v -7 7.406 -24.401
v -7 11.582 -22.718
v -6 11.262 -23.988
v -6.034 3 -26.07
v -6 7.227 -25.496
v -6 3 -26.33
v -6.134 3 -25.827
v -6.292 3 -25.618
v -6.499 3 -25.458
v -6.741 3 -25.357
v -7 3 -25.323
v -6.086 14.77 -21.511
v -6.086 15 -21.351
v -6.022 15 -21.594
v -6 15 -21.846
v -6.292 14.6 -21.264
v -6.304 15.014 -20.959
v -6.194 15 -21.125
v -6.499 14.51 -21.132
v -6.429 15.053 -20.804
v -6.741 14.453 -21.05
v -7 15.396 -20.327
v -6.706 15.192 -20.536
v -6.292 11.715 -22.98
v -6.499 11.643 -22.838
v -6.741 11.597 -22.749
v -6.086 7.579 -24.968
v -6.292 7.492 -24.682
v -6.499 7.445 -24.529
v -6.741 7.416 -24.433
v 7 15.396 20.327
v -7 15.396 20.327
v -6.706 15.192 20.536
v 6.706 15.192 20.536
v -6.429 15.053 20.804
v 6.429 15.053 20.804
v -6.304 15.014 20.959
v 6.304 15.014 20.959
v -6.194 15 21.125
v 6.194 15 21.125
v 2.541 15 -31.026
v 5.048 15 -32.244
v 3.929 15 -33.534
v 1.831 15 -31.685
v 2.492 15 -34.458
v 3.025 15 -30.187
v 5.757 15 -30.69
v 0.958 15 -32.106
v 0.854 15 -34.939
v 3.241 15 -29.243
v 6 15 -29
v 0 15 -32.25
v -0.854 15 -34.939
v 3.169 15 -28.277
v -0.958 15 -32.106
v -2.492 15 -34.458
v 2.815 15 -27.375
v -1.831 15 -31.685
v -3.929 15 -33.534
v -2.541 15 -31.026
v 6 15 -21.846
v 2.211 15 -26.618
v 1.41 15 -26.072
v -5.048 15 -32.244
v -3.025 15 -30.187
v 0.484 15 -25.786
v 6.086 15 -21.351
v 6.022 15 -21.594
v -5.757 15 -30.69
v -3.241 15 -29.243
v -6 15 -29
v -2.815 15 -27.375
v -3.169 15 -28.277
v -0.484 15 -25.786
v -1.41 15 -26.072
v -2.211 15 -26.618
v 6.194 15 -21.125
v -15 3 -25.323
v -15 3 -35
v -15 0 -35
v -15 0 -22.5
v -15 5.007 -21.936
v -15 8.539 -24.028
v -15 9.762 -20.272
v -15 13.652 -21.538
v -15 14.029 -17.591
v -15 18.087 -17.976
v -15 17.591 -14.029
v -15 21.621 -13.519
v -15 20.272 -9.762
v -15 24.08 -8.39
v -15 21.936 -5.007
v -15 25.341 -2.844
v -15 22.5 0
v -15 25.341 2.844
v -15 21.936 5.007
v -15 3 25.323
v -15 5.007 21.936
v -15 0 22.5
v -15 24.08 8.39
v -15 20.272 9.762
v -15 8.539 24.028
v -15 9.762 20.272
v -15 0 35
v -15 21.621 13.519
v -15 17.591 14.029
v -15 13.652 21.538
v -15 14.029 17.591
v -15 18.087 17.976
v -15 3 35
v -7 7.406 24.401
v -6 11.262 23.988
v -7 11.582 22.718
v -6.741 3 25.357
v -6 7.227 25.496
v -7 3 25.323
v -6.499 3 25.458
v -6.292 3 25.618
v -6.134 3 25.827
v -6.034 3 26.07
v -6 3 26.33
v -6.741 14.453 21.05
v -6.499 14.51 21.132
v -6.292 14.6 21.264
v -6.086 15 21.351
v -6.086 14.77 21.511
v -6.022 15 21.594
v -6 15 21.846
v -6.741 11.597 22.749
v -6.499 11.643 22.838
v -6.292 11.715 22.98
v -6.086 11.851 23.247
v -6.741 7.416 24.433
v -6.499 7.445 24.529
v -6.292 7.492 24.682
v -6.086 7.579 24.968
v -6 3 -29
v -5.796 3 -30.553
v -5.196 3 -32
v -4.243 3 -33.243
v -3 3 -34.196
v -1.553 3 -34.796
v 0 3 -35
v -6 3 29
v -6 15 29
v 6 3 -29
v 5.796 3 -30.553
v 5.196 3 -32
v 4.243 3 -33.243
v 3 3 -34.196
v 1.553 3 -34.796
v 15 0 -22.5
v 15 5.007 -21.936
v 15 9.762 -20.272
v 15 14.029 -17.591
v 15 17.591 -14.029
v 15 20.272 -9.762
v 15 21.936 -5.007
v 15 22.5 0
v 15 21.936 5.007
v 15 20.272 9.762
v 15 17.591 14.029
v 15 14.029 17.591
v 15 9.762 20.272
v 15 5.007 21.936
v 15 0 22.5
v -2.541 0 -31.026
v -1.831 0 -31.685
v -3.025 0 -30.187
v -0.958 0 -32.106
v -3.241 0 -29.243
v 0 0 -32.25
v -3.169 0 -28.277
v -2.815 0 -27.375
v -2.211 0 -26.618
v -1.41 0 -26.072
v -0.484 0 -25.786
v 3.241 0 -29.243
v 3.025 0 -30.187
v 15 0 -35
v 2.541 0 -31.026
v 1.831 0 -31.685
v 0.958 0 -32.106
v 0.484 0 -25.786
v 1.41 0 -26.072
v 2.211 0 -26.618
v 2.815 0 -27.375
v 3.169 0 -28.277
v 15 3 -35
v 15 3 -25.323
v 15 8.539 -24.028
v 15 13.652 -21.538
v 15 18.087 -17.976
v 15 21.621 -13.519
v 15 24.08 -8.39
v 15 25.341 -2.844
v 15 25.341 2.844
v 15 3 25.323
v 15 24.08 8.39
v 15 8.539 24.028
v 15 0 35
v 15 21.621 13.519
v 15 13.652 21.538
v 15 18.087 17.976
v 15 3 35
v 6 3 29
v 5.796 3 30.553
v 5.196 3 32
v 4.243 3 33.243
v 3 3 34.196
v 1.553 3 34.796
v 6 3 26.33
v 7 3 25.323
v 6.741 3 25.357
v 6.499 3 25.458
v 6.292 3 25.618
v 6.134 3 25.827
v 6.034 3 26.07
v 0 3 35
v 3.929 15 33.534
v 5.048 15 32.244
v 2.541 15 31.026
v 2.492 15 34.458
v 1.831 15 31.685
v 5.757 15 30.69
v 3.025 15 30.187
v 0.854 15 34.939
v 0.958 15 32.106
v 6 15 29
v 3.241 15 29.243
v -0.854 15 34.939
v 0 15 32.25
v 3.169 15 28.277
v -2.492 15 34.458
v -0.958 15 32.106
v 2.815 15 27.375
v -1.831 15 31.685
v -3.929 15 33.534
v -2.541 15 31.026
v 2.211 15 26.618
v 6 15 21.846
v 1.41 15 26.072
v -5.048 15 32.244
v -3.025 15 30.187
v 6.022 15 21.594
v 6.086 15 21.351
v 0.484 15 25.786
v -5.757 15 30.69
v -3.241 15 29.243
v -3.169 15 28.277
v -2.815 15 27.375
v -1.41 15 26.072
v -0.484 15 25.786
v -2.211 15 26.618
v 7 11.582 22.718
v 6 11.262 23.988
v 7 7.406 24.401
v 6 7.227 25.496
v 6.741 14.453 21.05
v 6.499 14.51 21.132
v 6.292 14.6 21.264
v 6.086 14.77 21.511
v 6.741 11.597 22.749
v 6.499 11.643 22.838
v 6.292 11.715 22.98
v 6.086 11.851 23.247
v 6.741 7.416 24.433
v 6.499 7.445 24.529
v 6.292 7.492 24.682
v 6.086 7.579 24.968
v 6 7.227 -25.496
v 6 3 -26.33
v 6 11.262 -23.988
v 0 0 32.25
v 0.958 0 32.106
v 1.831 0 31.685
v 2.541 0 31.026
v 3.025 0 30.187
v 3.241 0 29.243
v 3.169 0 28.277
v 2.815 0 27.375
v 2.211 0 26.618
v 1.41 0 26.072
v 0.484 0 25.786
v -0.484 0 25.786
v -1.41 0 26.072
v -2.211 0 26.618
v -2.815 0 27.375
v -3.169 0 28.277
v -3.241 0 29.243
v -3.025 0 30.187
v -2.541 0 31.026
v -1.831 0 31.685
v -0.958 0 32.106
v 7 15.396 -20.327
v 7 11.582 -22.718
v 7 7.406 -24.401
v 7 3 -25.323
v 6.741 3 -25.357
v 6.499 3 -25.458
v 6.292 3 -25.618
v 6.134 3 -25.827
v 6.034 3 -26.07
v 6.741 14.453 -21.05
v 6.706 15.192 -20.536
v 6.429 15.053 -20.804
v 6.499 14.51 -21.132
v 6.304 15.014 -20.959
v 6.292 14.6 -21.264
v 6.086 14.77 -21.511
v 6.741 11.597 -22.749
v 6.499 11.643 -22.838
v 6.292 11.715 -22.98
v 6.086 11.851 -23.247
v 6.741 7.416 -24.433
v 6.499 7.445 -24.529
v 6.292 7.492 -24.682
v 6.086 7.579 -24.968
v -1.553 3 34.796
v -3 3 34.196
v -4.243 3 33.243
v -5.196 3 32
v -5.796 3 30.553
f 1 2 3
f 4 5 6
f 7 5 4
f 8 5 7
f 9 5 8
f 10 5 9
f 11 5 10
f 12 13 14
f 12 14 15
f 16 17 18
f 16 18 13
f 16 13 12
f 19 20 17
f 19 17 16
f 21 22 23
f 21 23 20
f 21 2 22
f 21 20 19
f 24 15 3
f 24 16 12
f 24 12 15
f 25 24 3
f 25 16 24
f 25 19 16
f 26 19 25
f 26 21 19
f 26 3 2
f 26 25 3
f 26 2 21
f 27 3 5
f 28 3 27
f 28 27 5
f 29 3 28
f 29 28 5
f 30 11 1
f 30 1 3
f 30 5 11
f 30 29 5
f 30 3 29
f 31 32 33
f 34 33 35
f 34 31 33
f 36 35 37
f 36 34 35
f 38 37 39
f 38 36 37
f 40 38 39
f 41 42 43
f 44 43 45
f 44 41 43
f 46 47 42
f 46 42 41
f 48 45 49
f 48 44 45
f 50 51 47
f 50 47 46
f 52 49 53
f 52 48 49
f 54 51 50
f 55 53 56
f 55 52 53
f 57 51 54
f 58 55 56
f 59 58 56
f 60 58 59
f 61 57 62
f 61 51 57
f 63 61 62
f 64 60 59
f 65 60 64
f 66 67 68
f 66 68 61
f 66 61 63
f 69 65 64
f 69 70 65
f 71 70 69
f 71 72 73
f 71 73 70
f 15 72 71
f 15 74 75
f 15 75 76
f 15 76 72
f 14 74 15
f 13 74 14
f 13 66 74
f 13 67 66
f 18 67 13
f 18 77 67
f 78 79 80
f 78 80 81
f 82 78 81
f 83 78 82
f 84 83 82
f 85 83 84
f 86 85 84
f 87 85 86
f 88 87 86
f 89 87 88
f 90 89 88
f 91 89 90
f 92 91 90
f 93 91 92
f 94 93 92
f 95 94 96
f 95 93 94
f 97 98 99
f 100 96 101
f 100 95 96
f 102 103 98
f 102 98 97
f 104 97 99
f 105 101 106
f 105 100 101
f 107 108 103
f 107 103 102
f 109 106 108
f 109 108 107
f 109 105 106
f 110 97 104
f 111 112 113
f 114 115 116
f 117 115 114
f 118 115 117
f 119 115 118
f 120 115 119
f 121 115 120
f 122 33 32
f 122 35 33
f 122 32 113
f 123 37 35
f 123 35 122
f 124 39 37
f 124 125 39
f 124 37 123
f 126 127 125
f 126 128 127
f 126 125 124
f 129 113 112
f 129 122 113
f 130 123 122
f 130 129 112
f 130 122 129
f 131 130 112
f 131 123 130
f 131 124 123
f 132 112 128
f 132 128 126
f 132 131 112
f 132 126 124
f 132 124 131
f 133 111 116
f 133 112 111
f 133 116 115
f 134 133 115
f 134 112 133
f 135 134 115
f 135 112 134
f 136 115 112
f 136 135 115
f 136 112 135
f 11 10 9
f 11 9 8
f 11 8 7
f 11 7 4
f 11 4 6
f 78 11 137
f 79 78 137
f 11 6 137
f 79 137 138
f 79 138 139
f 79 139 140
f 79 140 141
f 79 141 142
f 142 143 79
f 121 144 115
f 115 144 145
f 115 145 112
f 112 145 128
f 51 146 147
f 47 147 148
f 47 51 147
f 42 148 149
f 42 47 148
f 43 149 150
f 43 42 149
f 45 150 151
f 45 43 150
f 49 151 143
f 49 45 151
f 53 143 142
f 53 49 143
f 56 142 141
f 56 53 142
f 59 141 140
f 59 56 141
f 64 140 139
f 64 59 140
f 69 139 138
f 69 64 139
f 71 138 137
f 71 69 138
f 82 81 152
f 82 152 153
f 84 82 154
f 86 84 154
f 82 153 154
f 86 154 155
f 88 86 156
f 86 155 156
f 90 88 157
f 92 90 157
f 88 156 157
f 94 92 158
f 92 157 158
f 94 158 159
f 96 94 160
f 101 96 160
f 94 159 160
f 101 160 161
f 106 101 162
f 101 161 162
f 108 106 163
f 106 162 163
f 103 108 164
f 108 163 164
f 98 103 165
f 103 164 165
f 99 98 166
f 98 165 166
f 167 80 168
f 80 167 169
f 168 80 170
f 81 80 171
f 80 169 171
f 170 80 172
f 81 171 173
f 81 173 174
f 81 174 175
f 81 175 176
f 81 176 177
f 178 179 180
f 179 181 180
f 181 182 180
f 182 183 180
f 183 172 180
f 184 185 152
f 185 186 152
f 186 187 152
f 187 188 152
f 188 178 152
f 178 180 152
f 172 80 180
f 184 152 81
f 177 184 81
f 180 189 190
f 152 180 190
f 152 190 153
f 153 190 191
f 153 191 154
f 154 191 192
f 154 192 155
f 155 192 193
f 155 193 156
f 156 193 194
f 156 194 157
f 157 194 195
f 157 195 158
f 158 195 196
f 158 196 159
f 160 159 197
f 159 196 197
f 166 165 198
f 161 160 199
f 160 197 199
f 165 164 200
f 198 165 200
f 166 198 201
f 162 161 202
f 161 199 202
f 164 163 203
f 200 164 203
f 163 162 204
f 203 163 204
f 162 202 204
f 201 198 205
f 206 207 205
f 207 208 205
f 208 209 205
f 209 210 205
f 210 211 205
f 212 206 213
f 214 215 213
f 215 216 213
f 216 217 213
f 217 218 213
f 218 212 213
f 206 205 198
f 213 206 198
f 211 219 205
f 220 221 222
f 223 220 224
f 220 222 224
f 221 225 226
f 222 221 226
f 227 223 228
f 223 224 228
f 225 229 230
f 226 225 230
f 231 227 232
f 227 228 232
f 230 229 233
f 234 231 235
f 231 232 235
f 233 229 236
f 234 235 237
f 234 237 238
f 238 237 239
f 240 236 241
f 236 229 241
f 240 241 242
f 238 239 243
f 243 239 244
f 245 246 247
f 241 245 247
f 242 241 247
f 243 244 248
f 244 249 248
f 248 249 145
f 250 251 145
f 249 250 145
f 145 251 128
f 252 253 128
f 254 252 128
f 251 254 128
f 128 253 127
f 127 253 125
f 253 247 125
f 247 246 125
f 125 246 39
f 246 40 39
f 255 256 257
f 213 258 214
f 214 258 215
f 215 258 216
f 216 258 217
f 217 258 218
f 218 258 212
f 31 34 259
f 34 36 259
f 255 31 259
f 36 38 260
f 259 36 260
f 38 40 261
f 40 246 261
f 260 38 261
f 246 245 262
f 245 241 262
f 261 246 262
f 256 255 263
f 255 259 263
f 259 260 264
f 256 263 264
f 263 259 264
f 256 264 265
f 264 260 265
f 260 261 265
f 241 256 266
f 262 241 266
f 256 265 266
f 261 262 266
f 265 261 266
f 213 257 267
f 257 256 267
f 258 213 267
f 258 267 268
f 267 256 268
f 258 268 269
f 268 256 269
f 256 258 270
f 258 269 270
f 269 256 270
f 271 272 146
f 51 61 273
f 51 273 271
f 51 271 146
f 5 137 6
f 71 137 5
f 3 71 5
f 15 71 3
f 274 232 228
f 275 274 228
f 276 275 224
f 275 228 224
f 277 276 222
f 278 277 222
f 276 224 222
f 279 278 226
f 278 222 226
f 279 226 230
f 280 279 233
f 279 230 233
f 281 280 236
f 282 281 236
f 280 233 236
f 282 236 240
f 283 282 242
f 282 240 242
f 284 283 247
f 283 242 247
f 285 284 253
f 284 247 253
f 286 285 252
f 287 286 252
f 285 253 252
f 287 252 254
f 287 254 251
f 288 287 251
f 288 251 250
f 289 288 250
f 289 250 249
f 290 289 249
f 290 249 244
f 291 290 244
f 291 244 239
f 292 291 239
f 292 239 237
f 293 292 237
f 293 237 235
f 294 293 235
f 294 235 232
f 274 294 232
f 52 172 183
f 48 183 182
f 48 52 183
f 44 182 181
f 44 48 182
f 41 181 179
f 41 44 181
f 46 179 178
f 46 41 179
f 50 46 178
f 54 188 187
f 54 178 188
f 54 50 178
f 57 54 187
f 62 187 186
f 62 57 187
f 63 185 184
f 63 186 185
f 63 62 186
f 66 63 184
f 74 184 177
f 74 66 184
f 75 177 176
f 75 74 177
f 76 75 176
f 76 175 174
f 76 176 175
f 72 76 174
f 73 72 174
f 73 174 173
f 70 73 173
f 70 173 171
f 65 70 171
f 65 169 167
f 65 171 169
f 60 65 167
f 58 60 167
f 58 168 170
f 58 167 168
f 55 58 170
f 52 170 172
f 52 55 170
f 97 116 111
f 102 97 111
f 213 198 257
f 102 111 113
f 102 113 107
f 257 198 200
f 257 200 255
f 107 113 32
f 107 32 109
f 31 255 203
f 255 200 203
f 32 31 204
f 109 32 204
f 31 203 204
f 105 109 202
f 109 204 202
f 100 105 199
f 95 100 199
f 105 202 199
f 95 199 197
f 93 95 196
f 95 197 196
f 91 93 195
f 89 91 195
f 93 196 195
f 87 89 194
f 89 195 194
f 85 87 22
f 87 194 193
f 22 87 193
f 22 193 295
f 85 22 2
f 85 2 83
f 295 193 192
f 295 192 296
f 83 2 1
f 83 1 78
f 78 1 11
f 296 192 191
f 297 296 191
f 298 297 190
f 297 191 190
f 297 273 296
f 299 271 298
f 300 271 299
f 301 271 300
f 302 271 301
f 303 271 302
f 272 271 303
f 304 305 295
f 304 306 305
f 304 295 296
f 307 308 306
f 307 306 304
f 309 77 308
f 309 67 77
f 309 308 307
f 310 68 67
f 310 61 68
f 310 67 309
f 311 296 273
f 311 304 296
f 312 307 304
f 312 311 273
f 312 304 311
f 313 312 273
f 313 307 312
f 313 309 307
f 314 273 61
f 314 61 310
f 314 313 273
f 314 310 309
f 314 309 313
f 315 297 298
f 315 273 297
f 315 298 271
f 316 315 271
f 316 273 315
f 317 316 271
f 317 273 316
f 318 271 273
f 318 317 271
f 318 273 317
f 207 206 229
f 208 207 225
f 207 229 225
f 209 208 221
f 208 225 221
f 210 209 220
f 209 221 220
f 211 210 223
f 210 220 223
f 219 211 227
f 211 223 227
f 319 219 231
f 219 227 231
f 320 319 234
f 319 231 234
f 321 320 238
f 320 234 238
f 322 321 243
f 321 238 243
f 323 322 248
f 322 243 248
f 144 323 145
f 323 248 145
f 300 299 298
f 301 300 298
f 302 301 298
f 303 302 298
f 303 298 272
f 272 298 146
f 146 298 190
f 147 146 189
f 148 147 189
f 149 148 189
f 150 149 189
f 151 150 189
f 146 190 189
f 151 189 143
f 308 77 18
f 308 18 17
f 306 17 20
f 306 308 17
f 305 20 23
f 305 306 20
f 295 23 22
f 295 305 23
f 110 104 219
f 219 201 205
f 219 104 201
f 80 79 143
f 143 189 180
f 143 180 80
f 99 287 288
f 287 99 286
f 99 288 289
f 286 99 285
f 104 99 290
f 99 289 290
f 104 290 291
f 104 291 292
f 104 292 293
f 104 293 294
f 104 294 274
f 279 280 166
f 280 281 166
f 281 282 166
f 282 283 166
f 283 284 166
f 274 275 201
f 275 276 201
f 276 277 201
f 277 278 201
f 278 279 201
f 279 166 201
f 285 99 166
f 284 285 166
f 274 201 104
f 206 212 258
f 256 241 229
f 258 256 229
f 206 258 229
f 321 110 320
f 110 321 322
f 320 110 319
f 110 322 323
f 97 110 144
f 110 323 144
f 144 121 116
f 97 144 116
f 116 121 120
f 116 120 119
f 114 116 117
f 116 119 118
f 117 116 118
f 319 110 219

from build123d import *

# Parameters (mm, degrees)
BOSS_EXTRUDE1_DEPTH = 15
BOSS_EXTRUDE2_REACH = 42.927
SKETCH3_R           = 3.25
CUT_EXTRUDE1_DEPTH  = 41.926763859
FILLET1_R           = 1


with BuildPart() as part:
    # Sketch1 → Boss-Extrude1 (new, symmetric)
    with BuildSketch(Plane(origin=(0, 0, 0), x_dir=(0, 0, -1), z_dir=(1, 0, 0))):
        with BuildLine():
            Line((-22.5, 0), (-35, 0))
            Line((-35, 0), (-35, 3))
            Line((-35, 3), (-25.322914524, 3))
            ThreePointArc((-25.322914524, 3), (0, 25.5), (25.322914524, 3))
            Line((25.322914524, 3), (35, 3))
            Line((35, 3), (35, 0))
            Line((35, 0), (22.5, 0))
            ThreePointArc((22.5, 0), (0, 22.5), (-22.5, 0))
        make_face()
    extrude(amount=BOSS_EXTRUDE1_DEPTH, both=True)

    # Sketch2 → Boss-Extrude2 (add, up to next)
    with BuildSketch(Plane(origin=(0, 15, 0), x_dir=(1, 0, 0), z_dir=(0, 1, 0)), mode=Mode.PRIVATE) as boss_extrude2_sk1:
        with BuildLine():
            Line((-6, -29), (-6, -19))
            Line((-6, -19), (6, -19))
            Line((6, -19), (6, -29))
            ThreePointArc((6, -29), (0, -35), (-6, -29))
        make_face()
    boss_extrude2_tool1 = extrude(boss_extrude2_sk1.sketch, amount=-BOSS_EXTRUDE2_REACH, mode=Mode.PRIVATE) - part.part
    boss_extrude2 = boss_extrude2_tool1.solids().sort_by_distance((0, 15, 26.417143))[0]
    add(boss_extrude2)

    # Sketch3 → Cut-Extrude1 (cut, through all)
    with BuildSketch(Plane(origin=(0, 15, 0), x_dir=(1, 0, 0), z_dir=(0, 1, 0))):
        with Locations(Location((0, -29, 0), (0, 0, 270))):
            Circle(SKETCH3_R)
    cut_extrude1 = extrude(amount=-CUT_EXTRUDE1_DEPTH, mode=Mode.SUBTRACT)

    # Mirror1: Boss-Extrude2, Cut-Extrude1 across plane
    add(boss_extrude2.mirror(Plane.XY))
    add(cut_extrude1.mirror(Plane.XY), mode=Mode.SUBTRACT)

    # Fillet1
    fillet1_edges = [part.edges().sort_by_distance(p)[0] for p in [
        (-6, 9.301914405, 23.742880794),
        (6, 9.301914405, 23.742880794),
        (0, 15, 20.621590627),
        (-6, 9.301914405, -23.742880794),
        (6, 9.301914405, -23.742880794),
        (0, 15, -20.621590627),
    ]]
    fillet(fillet1_edges, radius=FILLET1_R)


solid = part.part
